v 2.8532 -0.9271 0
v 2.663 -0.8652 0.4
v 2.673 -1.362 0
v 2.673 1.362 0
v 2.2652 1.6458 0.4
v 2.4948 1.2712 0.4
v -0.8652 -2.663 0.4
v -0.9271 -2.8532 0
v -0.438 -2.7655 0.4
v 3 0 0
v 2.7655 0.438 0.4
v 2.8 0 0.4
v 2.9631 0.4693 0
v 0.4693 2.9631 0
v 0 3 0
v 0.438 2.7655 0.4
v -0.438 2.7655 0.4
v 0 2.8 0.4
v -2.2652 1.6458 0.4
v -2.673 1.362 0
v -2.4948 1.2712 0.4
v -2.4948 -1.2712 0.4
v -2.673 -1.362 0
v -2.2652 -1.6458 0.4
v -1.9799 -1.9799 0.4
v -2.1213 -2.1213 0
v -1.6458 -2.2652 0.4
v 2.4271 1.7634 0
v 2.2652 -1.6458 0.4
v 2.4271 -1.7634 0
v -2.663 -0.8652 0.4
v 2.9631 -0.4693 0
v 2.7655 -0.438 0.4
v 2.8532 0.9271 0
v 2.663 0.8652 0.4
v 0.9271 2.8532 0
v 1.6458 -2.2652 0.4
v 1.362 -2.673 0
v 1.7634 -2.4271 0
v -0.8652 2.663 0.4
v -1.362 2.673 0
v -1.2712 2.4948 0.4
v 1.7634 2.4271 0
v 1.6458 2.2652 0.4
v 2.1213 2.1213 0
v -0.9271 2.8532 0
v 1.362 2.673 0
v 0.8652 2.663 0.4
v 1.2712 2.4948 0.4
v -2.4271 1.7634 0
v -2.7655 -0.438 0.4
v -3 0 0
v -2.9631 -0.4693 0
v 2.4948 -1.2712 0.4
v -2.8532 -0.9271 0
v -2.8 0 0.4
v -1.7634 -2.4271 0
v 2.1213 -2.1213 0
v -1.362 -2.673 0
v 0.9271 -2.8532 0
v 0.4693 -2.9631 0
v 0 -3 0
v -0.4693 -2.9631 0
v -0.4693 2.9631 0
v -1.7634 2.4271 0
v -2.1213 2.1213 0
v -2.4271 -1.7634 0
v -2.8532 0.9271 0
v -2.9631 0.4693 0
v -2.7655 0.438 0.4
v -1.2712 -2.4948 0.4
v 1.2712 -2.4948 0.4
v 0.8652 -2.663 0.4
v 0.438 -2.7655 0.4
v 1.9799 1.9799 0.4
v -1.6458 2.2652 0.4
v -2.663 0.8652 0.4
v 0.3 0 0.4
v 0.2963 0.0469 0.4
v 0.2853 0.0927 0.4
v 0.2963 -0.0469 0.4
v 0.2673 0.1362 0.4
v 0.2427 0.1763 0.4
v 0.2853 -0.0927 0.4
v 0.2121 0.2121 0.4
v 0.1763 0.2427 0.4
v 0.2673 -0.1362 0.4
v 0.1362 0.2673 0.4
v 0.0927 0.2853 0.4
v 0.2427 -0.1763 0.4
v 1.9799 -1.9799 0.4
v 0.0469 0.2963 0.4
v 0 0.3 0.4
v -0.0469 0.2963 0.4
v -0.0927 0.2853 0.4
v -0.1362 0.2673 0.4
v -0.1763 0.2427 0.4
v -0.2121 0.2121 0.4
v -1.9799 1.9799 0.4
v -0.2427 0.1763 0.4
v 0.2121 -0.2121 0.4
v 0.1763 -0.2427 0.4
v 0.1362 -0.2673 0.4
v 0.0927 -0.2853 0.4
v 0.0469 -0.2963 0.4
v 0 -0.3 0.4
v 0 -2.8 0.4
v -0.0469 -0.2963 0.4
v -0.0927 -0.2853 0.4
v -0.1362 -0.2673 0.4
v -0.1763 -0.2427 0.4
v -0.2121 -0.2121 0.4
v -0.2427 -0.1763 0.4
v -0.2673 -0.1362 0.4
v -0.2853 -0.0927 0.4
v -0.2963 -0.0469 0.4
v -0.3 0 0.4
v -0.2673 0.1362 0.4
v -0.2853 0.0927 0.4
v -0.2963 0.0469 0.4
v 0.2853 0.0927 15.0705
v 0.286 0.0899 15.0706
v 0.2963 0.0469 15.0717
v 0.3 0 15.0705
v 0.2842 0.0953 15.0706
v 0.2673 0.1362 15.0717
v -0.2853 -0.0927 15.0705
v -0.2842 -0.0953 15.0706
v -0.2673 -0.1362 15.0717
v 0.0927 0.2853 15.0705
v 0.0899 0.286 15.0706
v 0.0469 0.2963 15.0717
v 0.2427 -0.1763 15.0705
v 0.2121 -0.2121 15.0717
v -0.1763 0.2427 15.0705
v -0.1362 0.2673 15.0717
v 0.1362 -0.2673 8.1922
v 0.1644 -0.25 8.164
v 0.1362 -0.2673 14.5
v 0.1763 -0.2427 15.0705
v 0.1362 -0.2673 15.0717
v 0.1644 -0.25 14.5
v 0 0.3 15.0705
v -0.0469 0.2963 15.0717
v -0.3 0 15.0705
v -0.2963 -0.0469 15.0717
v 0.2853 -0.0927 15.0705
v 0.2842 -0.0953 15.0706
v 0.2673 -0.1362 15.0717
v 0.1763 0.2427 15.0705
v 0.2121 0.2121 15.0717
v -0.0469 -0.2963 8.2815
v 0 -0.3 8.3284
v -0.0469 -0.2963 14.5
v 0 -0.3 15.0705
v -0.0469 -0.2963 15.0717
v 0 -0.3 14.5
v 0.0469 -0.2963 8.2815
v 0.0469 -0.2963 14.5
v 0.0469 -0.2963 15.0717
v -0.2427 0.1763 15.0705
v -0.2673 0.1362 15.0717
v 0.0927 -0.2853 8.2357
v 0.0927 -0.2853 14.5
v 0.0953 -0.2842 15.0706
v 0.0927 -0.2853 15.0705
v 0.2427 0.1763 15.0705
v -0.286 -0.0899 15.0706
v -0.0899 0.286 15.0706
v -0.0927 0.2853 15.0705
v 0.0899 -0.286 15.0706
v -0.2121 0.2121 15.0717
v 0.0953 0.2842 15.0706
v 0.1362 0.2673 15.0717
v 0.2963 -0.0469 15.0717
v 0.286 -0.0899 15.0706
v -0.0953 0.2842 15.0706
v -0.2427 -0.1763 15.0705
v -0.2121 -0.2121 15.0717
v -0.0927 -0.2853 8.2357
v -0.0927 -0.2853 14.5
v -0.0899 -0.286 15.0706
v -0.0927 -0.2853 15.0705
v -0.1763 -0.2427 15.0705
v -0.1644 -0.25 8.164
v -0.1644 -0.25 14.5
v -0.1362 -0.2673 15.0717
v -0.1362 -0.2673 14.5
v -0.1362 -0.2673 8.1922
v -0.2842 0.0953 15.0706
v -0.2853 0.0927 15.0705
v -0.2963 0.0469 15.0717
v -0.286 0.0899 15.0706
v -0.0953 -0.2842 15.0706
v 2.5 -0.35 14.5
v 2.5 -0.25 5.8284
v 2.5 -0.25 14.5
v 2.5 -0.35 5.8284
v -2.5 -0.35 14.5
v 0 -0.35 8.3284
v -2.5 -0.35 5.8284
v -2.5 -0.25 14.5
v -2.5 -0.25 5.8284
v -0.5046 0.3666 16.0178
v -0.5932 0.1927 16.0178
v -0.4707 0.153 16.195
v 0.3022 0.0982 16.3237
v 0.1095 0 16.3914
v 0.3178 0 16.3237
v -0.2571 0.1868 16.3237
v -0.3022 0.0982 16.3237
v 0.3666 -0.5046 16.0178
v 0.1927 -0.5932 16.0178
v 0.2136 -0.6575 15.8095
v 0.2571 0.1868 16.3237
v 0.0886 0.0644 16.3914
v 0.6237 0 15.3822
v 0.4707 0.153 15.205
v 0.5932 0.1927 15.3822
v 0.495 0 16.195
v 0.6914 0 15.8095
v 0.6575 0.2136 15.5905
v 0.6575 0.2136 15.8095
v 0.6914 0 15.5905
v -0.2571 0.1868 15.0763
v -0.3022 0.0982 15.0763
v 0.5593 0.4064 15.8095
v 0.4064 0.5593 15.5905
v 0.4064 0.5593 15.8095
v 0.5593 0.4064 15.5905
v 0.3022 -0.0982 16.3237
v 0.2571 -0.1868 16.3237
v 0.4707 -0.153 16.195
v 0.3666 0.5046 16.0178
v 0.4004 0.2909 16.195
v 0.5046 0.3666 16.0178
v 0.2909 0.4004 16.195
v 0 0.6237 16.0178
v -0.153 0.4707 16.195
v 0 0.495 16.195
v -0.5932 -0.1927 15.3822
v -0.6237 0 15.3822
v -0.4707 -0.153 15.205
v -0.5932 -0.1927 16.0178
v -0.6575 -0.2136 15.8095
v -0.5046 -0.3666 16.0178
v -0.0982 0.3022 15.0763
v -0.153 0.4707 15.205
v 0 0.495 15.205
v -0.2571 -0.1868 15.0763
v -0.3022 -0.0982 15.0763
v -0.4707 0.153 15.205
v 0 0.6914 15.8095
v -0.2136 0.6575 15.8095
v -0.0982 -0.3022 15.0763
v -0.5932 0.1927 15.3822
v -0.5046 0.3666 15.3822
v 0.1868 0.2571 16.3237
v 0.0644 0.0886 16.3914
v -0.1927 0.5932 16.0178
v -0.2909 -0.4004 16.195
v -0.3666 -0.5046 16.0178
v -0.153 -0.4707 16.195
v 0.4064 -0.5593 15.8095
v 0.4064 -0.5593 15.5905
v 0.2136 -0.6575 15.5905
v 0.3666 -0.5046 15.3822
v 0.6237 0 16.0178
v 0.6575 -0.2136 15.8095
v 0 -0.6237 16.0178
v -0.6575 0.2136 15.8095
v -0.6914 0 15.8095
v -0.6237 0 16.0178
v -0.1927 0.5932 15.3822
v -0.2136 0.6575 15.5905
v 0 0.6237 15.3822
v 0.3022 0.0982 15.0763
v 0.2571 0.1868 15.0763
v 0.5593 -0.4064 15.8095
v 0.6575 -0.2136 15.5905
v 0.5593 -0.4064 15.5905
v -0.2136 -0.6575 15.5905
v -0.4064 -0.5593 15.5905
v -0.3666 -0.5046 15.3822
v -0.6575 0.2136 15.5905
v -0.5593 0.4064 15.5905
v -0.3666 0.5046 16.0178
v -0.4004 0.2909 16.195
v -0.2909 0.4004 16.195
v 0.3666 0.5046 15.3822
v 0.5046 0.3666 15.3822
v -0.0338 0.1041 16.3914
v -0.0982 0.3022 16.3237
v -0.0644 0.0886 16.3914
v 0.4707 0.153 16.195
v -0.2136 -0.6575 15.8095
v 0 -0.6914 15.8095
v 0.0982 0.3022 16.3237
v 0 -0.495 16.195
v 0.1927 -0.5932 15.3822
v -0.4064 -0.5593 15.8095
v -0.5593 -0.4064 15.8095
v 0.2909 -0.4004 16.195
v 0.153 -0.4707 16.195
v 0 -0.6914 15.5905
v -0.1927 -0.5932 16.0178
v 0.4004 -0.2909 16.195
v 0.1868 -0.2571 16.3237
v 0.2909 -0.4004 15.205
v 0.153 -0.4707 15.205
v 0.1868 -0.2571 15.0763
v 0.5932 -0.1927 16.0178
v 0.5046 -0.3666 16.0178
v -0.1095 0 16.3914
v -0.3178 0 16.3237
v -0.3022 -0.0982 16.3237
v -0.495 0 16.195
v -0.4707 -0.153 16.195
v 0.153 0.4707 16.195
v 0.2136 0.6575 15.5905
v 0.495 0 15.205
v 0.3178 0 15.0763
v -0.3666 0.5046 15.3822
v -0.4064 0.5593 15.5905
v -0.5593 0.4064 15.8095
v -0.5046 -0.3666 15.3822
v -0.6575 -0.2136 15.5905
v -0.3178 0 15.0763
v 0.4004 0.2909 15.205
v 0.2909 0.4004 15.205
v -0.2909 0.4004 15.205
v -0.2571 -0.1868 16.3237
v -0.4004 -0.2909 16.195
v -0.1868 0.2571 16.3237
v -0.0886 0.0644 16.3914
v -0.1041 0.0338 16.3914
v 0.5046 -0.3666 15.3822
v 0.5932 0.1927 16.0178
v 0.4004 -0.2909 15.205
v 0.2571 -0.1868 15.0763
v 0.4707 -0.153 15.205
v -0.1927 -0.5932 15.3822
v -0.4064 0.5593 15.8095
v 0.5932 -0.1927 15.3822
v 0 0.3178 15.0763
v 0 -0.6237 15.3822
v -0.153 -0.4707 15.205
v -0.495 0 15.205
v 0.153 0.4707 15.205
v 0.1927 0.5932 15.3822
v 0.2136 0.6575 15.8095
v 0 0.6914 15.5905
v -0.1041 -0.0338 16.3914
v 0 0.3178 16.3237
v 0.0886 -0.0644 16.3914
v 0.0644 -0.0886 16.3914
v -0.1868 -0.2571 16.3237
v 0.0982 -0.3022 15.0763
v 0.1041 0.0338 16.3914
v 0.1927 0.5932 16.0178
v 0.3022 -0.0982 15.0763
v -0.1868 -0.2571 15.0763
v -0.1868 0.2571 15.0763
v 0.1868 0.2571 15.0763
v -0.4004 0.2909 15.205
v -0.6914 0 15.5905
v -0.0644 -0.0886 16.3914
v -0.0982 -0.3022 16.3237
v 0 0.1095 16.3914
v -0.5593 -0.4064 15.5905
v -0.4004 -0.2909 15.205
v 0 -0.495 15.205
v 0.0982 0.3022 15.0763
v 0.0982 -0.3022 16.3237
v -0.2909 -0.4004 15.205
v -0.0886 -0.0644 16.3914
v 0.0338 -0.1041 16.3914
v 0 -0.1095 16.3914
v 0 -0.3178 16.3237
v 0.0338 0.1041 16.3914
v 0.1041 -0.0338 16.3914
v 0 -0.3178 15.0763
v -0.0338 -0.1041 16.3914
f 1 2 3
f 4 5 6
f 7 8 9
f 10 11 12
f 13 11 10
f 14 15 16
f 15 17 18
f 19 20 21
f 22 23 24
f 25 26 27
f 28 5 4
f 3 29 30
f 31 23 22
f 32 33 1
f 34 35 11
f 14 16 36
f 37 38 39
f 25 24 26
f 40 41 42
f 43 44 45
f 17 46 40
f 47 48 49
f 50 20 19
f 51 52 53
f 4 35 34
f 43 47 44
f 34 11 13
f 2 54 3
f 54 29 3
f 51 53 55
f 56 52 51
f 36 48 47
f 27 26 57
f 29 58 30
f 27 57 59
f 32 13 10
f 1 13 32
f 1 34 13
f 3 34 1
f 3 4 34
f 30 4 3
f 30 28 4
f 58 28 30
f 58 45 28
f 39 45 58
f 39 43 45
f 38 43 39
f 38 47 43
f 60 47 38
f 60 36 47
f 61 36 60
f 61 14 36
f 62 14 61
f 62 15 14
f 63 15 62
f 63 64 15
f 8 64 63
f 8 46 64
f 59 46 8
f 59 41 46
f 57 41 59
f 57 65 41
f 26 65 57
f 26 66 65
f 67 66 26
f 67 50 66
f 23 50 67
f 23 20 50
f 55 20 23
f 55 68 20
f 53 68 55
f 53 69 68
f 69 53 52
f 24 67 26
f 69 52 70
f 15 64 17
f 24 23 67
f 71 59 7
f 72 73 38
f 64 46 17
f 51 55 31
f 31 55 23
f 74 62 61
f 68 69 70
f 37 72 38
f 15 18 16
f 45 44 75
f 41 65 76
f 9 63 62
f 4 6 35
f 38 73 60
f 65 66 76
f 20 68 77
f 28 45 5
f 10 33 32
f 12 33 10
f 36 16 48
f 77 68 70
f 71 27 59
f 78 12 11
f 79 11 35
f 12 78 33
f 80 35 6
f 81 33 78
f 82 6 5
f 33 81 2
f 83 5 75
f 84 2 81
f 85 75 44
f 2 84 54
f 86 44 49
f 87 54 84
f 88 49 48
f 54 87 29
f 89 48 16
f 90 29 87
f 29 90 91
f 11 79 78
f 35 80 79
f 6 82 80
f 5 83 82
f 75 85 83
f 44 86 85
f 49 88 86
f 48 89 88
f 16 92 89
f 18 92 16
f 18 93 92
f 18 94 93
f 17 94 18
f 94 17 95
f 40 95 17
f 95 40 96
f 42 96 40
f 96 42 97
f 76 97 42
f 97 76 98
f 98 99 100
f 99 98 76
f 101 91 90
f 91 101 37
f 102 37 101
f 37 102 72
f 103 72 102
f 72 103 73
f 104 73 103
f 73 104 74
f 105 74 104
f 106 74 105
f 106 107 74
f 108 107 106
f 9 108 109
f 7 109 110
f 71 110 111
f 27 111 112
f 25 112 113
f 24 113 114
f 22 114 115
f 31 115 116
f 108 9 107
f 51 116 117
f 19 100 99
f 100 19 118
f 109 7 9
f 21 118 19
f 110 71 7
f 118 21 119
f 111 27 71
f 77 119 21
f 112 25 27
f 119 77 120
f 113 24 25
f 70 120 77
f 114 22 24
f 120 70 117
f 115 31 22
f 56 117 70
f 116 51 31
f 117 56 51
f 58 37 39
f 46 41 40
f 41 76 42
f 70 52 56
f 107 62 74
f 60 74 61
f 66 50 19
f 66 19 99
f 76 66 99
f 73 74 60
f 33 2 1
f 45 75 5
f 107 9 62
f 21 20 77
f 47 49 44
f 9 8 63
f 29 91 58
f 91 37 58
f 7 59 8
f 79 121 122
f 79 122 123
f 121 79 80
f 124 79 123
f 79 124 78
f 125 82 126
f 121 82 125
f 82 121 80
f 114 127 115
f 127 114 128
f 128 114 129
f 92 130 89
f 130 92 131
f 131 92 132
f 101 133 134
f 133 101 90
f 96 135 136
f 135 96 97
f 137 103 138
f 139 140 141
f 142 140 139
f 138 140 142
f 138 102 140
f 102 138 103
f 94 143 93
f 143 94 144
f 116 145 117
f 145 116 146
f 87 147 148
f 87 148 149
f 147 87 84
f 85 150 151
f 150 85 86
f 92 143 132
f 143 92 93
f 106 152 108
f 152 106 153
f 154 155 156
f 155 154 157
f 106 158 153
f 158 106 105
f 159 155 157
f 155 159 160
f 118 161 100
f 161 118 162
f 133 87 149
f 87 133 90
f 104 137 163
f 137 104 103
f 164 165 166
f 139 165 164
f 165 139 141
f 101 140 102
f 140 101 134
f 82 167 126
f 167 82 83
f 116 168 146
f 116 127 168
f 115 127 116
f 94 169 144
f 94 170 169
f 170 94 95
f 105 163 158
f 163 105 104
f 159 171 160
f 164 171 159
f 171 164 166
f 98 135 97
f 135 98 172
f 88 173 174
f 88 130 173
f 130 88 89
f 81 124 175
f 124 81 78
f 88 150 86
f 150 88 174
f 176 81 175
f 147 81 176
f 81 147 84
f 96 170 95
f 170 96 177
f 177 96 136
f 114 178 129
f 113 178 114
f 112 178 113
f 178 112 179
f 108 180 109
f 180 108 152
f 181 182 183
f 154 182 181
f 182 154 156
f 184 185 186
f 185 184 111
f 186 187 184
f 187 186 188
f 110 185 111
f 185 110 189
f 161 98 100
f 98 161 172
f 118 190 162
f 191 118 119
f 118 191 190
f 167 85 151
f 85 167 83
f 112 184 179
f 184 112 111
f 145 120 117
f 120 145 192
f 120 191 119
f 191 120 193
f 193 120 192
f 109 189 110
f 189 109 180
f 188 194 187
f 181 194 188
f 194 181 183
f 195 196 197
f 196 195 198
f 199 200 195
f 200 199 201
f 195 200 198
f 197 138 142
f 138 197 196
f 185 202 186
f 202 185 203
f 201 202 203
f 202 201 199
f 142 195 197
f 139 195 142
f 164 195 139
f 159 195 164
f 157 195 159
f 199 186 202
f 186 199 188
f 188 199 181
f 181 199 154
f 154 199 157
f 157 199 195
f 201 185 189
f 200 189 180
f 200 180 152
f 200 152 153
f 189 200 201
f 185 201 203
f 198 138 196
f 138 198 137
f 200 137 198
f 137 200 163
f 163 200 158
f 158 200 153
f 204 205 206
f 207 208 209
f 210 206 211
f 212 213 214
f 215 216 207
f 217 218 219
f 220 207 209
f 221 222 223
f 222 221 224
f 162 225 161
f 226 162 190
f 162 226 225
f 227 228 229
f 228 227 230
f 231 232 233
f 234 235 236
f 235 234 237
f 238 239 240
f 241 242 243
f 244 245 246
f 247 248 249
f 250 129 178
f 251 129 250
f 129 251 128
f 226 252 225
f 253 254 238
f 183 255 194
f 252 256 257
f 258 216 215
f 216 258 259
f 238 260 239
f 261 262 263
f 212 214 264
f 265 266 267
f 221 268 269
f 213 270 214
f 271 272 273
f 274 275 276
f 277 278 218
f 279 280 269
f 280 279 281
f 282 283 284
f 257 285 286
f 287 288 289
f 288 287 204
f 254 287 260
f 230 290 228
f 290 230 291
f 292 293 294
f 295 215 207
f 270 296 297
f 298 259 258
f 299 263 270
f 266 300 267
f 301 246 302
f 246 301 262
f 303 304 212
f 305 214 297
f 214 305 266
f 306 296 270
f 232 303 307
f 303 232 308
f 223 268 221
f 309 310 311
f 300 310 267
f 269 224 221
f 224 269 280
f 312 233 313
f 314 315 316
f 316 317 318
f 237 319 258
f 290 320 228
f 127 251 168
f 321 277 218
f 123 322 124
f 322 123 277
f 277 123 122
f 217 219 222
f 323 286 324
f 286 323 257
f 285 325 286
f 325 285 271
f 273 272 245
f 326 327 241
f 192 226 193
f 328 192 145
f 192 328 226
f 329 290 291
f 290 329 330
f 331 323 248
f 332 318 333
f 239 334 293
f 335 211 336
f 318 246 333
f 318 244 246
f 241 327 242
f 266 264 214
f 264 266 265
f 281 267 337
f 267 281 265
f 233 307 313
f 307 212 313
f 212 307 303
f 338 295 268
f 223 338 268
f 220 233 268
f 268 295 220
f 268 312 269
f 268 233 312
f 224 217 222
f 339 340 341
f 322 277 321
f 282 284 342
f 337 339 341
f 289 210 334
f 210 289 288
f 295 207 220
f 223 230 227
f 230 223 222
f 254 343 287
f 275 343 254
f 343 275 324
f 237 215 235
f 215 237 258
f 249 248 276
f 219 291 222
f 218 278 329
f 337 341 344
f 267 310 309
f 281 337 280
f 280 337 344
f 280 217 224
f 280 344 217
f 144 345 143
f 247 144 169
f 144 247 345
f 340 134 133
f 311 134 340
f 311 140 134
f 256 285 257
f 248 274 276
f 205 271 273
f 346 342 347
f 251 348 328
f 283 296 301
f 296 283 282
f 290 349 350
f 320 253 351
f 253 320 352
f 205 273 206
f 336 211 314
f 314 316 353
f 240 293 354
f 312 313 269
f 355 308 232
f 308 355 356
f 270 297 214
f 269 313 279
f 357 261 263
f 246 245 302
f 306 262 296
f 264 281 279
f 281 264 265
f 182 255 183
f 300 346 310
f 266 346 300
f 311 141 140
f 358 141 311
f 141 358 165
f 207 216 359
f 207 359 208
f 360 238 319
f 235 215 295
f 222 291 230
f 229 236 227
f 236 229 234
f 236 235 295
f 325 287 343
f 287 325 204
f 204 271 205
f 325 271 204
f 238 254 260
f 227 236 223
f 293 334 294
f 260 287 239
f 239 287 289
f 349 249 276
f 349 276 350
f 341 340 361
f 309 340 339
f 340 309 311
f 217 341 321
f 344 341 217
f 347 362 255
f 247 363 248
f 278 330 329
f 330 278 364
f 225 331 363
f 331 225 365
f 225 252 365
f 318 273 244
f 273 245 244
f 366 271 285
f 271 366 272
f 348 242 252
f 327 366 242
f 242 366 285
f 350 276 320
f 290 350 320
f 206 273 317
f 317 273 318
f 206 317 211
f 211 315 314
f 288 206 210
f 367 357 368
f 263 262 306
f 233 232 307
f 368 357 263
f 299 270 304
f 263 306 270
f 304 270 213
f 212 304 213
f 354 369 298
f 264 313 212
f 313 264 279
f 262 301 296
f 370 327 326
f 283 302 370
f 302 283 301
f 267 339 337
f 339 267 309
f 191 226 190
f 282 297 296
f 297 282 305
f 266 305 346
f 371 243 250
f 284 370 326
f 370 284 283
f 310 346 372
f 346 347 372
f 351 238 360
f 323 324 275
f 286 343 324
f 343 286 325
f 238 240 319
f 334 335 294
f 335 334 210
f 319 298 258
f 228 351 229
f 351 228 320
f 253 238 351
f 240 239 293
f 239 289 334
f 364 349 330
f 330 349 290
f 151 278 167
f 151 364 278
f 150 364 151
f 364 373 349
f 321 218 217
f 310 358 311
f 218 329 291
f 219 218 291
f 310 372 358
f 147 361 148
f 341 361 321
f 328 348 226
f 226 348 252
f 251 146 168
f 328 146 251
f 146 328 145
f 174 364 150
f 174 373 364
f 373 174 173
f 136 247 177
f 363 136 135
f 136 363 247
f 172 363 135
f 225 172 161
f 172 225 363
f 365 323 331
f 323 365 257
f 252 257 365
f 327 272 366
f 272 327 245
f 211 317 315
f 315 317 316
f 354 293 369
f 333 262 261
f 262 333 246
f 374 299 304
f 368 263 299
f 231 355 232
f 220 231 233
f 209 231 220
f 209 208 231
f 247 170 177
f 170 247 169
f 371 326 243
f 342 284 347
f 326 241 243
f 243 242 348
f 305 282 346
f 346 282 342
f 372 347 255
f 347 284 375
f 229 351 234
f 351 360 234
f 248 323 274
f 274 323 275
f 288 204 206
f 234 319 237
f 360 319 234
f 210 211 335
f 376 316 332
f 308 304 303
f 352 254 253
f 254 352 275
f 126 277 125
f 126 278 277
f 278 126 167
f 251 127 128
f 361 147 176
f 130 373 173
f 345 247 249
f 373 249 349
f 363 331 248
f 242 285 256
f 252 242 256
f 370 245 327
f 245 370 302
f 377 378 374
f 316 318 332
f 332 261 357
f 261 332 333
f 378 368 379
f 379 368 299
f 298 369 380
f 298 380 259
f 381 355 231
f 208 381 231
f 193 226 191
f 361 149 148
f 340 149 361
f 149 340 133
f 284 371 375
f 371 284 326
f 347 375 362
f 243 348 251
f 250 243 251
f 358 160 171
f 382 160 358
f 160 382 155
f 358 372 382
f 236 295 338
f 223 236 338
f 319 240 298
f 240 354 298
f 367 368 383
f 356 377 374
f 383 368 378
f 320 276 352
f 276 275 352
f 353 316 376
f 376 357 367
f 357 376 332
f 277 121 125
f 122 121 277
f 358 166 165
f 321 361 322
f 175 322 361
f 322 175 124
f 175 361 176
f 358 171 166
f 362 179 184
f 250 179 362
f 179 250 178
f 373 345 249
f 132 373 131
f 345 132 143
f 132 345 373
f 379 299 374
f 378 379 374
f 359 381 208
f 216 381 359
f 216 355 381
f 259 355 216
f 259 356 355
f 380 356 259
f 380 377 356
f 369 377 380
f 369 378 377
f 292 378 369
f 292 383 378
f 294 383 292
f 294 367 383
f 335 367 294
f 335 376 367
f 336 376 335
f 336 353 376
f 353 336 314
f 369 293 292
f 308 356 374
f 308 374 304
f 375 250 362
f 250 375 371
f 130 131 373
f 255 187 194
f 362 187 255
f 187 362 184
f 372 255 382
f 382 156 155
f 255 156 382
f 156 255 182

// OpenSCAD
module banner(){

color("gray"){
cylinder(0.4,3,2.8, $fn =40);

translate([0,0,0.3])
cylinder(15,0.3,0.3, $fn = 40);

}

color("gray")

translate([0,0,15.7], $fn = 20)
sphere(r =0.7);


translate([0.0,-0.3,10])

rotate([90,0,0]){

difference(){
color("green")
cube([5,9,0.1], center=true );


translate([0,-4.5,0])
rotate([0,0,45]){

cube([4,4,0.9], center=true );
}
}
}
}

banner();
